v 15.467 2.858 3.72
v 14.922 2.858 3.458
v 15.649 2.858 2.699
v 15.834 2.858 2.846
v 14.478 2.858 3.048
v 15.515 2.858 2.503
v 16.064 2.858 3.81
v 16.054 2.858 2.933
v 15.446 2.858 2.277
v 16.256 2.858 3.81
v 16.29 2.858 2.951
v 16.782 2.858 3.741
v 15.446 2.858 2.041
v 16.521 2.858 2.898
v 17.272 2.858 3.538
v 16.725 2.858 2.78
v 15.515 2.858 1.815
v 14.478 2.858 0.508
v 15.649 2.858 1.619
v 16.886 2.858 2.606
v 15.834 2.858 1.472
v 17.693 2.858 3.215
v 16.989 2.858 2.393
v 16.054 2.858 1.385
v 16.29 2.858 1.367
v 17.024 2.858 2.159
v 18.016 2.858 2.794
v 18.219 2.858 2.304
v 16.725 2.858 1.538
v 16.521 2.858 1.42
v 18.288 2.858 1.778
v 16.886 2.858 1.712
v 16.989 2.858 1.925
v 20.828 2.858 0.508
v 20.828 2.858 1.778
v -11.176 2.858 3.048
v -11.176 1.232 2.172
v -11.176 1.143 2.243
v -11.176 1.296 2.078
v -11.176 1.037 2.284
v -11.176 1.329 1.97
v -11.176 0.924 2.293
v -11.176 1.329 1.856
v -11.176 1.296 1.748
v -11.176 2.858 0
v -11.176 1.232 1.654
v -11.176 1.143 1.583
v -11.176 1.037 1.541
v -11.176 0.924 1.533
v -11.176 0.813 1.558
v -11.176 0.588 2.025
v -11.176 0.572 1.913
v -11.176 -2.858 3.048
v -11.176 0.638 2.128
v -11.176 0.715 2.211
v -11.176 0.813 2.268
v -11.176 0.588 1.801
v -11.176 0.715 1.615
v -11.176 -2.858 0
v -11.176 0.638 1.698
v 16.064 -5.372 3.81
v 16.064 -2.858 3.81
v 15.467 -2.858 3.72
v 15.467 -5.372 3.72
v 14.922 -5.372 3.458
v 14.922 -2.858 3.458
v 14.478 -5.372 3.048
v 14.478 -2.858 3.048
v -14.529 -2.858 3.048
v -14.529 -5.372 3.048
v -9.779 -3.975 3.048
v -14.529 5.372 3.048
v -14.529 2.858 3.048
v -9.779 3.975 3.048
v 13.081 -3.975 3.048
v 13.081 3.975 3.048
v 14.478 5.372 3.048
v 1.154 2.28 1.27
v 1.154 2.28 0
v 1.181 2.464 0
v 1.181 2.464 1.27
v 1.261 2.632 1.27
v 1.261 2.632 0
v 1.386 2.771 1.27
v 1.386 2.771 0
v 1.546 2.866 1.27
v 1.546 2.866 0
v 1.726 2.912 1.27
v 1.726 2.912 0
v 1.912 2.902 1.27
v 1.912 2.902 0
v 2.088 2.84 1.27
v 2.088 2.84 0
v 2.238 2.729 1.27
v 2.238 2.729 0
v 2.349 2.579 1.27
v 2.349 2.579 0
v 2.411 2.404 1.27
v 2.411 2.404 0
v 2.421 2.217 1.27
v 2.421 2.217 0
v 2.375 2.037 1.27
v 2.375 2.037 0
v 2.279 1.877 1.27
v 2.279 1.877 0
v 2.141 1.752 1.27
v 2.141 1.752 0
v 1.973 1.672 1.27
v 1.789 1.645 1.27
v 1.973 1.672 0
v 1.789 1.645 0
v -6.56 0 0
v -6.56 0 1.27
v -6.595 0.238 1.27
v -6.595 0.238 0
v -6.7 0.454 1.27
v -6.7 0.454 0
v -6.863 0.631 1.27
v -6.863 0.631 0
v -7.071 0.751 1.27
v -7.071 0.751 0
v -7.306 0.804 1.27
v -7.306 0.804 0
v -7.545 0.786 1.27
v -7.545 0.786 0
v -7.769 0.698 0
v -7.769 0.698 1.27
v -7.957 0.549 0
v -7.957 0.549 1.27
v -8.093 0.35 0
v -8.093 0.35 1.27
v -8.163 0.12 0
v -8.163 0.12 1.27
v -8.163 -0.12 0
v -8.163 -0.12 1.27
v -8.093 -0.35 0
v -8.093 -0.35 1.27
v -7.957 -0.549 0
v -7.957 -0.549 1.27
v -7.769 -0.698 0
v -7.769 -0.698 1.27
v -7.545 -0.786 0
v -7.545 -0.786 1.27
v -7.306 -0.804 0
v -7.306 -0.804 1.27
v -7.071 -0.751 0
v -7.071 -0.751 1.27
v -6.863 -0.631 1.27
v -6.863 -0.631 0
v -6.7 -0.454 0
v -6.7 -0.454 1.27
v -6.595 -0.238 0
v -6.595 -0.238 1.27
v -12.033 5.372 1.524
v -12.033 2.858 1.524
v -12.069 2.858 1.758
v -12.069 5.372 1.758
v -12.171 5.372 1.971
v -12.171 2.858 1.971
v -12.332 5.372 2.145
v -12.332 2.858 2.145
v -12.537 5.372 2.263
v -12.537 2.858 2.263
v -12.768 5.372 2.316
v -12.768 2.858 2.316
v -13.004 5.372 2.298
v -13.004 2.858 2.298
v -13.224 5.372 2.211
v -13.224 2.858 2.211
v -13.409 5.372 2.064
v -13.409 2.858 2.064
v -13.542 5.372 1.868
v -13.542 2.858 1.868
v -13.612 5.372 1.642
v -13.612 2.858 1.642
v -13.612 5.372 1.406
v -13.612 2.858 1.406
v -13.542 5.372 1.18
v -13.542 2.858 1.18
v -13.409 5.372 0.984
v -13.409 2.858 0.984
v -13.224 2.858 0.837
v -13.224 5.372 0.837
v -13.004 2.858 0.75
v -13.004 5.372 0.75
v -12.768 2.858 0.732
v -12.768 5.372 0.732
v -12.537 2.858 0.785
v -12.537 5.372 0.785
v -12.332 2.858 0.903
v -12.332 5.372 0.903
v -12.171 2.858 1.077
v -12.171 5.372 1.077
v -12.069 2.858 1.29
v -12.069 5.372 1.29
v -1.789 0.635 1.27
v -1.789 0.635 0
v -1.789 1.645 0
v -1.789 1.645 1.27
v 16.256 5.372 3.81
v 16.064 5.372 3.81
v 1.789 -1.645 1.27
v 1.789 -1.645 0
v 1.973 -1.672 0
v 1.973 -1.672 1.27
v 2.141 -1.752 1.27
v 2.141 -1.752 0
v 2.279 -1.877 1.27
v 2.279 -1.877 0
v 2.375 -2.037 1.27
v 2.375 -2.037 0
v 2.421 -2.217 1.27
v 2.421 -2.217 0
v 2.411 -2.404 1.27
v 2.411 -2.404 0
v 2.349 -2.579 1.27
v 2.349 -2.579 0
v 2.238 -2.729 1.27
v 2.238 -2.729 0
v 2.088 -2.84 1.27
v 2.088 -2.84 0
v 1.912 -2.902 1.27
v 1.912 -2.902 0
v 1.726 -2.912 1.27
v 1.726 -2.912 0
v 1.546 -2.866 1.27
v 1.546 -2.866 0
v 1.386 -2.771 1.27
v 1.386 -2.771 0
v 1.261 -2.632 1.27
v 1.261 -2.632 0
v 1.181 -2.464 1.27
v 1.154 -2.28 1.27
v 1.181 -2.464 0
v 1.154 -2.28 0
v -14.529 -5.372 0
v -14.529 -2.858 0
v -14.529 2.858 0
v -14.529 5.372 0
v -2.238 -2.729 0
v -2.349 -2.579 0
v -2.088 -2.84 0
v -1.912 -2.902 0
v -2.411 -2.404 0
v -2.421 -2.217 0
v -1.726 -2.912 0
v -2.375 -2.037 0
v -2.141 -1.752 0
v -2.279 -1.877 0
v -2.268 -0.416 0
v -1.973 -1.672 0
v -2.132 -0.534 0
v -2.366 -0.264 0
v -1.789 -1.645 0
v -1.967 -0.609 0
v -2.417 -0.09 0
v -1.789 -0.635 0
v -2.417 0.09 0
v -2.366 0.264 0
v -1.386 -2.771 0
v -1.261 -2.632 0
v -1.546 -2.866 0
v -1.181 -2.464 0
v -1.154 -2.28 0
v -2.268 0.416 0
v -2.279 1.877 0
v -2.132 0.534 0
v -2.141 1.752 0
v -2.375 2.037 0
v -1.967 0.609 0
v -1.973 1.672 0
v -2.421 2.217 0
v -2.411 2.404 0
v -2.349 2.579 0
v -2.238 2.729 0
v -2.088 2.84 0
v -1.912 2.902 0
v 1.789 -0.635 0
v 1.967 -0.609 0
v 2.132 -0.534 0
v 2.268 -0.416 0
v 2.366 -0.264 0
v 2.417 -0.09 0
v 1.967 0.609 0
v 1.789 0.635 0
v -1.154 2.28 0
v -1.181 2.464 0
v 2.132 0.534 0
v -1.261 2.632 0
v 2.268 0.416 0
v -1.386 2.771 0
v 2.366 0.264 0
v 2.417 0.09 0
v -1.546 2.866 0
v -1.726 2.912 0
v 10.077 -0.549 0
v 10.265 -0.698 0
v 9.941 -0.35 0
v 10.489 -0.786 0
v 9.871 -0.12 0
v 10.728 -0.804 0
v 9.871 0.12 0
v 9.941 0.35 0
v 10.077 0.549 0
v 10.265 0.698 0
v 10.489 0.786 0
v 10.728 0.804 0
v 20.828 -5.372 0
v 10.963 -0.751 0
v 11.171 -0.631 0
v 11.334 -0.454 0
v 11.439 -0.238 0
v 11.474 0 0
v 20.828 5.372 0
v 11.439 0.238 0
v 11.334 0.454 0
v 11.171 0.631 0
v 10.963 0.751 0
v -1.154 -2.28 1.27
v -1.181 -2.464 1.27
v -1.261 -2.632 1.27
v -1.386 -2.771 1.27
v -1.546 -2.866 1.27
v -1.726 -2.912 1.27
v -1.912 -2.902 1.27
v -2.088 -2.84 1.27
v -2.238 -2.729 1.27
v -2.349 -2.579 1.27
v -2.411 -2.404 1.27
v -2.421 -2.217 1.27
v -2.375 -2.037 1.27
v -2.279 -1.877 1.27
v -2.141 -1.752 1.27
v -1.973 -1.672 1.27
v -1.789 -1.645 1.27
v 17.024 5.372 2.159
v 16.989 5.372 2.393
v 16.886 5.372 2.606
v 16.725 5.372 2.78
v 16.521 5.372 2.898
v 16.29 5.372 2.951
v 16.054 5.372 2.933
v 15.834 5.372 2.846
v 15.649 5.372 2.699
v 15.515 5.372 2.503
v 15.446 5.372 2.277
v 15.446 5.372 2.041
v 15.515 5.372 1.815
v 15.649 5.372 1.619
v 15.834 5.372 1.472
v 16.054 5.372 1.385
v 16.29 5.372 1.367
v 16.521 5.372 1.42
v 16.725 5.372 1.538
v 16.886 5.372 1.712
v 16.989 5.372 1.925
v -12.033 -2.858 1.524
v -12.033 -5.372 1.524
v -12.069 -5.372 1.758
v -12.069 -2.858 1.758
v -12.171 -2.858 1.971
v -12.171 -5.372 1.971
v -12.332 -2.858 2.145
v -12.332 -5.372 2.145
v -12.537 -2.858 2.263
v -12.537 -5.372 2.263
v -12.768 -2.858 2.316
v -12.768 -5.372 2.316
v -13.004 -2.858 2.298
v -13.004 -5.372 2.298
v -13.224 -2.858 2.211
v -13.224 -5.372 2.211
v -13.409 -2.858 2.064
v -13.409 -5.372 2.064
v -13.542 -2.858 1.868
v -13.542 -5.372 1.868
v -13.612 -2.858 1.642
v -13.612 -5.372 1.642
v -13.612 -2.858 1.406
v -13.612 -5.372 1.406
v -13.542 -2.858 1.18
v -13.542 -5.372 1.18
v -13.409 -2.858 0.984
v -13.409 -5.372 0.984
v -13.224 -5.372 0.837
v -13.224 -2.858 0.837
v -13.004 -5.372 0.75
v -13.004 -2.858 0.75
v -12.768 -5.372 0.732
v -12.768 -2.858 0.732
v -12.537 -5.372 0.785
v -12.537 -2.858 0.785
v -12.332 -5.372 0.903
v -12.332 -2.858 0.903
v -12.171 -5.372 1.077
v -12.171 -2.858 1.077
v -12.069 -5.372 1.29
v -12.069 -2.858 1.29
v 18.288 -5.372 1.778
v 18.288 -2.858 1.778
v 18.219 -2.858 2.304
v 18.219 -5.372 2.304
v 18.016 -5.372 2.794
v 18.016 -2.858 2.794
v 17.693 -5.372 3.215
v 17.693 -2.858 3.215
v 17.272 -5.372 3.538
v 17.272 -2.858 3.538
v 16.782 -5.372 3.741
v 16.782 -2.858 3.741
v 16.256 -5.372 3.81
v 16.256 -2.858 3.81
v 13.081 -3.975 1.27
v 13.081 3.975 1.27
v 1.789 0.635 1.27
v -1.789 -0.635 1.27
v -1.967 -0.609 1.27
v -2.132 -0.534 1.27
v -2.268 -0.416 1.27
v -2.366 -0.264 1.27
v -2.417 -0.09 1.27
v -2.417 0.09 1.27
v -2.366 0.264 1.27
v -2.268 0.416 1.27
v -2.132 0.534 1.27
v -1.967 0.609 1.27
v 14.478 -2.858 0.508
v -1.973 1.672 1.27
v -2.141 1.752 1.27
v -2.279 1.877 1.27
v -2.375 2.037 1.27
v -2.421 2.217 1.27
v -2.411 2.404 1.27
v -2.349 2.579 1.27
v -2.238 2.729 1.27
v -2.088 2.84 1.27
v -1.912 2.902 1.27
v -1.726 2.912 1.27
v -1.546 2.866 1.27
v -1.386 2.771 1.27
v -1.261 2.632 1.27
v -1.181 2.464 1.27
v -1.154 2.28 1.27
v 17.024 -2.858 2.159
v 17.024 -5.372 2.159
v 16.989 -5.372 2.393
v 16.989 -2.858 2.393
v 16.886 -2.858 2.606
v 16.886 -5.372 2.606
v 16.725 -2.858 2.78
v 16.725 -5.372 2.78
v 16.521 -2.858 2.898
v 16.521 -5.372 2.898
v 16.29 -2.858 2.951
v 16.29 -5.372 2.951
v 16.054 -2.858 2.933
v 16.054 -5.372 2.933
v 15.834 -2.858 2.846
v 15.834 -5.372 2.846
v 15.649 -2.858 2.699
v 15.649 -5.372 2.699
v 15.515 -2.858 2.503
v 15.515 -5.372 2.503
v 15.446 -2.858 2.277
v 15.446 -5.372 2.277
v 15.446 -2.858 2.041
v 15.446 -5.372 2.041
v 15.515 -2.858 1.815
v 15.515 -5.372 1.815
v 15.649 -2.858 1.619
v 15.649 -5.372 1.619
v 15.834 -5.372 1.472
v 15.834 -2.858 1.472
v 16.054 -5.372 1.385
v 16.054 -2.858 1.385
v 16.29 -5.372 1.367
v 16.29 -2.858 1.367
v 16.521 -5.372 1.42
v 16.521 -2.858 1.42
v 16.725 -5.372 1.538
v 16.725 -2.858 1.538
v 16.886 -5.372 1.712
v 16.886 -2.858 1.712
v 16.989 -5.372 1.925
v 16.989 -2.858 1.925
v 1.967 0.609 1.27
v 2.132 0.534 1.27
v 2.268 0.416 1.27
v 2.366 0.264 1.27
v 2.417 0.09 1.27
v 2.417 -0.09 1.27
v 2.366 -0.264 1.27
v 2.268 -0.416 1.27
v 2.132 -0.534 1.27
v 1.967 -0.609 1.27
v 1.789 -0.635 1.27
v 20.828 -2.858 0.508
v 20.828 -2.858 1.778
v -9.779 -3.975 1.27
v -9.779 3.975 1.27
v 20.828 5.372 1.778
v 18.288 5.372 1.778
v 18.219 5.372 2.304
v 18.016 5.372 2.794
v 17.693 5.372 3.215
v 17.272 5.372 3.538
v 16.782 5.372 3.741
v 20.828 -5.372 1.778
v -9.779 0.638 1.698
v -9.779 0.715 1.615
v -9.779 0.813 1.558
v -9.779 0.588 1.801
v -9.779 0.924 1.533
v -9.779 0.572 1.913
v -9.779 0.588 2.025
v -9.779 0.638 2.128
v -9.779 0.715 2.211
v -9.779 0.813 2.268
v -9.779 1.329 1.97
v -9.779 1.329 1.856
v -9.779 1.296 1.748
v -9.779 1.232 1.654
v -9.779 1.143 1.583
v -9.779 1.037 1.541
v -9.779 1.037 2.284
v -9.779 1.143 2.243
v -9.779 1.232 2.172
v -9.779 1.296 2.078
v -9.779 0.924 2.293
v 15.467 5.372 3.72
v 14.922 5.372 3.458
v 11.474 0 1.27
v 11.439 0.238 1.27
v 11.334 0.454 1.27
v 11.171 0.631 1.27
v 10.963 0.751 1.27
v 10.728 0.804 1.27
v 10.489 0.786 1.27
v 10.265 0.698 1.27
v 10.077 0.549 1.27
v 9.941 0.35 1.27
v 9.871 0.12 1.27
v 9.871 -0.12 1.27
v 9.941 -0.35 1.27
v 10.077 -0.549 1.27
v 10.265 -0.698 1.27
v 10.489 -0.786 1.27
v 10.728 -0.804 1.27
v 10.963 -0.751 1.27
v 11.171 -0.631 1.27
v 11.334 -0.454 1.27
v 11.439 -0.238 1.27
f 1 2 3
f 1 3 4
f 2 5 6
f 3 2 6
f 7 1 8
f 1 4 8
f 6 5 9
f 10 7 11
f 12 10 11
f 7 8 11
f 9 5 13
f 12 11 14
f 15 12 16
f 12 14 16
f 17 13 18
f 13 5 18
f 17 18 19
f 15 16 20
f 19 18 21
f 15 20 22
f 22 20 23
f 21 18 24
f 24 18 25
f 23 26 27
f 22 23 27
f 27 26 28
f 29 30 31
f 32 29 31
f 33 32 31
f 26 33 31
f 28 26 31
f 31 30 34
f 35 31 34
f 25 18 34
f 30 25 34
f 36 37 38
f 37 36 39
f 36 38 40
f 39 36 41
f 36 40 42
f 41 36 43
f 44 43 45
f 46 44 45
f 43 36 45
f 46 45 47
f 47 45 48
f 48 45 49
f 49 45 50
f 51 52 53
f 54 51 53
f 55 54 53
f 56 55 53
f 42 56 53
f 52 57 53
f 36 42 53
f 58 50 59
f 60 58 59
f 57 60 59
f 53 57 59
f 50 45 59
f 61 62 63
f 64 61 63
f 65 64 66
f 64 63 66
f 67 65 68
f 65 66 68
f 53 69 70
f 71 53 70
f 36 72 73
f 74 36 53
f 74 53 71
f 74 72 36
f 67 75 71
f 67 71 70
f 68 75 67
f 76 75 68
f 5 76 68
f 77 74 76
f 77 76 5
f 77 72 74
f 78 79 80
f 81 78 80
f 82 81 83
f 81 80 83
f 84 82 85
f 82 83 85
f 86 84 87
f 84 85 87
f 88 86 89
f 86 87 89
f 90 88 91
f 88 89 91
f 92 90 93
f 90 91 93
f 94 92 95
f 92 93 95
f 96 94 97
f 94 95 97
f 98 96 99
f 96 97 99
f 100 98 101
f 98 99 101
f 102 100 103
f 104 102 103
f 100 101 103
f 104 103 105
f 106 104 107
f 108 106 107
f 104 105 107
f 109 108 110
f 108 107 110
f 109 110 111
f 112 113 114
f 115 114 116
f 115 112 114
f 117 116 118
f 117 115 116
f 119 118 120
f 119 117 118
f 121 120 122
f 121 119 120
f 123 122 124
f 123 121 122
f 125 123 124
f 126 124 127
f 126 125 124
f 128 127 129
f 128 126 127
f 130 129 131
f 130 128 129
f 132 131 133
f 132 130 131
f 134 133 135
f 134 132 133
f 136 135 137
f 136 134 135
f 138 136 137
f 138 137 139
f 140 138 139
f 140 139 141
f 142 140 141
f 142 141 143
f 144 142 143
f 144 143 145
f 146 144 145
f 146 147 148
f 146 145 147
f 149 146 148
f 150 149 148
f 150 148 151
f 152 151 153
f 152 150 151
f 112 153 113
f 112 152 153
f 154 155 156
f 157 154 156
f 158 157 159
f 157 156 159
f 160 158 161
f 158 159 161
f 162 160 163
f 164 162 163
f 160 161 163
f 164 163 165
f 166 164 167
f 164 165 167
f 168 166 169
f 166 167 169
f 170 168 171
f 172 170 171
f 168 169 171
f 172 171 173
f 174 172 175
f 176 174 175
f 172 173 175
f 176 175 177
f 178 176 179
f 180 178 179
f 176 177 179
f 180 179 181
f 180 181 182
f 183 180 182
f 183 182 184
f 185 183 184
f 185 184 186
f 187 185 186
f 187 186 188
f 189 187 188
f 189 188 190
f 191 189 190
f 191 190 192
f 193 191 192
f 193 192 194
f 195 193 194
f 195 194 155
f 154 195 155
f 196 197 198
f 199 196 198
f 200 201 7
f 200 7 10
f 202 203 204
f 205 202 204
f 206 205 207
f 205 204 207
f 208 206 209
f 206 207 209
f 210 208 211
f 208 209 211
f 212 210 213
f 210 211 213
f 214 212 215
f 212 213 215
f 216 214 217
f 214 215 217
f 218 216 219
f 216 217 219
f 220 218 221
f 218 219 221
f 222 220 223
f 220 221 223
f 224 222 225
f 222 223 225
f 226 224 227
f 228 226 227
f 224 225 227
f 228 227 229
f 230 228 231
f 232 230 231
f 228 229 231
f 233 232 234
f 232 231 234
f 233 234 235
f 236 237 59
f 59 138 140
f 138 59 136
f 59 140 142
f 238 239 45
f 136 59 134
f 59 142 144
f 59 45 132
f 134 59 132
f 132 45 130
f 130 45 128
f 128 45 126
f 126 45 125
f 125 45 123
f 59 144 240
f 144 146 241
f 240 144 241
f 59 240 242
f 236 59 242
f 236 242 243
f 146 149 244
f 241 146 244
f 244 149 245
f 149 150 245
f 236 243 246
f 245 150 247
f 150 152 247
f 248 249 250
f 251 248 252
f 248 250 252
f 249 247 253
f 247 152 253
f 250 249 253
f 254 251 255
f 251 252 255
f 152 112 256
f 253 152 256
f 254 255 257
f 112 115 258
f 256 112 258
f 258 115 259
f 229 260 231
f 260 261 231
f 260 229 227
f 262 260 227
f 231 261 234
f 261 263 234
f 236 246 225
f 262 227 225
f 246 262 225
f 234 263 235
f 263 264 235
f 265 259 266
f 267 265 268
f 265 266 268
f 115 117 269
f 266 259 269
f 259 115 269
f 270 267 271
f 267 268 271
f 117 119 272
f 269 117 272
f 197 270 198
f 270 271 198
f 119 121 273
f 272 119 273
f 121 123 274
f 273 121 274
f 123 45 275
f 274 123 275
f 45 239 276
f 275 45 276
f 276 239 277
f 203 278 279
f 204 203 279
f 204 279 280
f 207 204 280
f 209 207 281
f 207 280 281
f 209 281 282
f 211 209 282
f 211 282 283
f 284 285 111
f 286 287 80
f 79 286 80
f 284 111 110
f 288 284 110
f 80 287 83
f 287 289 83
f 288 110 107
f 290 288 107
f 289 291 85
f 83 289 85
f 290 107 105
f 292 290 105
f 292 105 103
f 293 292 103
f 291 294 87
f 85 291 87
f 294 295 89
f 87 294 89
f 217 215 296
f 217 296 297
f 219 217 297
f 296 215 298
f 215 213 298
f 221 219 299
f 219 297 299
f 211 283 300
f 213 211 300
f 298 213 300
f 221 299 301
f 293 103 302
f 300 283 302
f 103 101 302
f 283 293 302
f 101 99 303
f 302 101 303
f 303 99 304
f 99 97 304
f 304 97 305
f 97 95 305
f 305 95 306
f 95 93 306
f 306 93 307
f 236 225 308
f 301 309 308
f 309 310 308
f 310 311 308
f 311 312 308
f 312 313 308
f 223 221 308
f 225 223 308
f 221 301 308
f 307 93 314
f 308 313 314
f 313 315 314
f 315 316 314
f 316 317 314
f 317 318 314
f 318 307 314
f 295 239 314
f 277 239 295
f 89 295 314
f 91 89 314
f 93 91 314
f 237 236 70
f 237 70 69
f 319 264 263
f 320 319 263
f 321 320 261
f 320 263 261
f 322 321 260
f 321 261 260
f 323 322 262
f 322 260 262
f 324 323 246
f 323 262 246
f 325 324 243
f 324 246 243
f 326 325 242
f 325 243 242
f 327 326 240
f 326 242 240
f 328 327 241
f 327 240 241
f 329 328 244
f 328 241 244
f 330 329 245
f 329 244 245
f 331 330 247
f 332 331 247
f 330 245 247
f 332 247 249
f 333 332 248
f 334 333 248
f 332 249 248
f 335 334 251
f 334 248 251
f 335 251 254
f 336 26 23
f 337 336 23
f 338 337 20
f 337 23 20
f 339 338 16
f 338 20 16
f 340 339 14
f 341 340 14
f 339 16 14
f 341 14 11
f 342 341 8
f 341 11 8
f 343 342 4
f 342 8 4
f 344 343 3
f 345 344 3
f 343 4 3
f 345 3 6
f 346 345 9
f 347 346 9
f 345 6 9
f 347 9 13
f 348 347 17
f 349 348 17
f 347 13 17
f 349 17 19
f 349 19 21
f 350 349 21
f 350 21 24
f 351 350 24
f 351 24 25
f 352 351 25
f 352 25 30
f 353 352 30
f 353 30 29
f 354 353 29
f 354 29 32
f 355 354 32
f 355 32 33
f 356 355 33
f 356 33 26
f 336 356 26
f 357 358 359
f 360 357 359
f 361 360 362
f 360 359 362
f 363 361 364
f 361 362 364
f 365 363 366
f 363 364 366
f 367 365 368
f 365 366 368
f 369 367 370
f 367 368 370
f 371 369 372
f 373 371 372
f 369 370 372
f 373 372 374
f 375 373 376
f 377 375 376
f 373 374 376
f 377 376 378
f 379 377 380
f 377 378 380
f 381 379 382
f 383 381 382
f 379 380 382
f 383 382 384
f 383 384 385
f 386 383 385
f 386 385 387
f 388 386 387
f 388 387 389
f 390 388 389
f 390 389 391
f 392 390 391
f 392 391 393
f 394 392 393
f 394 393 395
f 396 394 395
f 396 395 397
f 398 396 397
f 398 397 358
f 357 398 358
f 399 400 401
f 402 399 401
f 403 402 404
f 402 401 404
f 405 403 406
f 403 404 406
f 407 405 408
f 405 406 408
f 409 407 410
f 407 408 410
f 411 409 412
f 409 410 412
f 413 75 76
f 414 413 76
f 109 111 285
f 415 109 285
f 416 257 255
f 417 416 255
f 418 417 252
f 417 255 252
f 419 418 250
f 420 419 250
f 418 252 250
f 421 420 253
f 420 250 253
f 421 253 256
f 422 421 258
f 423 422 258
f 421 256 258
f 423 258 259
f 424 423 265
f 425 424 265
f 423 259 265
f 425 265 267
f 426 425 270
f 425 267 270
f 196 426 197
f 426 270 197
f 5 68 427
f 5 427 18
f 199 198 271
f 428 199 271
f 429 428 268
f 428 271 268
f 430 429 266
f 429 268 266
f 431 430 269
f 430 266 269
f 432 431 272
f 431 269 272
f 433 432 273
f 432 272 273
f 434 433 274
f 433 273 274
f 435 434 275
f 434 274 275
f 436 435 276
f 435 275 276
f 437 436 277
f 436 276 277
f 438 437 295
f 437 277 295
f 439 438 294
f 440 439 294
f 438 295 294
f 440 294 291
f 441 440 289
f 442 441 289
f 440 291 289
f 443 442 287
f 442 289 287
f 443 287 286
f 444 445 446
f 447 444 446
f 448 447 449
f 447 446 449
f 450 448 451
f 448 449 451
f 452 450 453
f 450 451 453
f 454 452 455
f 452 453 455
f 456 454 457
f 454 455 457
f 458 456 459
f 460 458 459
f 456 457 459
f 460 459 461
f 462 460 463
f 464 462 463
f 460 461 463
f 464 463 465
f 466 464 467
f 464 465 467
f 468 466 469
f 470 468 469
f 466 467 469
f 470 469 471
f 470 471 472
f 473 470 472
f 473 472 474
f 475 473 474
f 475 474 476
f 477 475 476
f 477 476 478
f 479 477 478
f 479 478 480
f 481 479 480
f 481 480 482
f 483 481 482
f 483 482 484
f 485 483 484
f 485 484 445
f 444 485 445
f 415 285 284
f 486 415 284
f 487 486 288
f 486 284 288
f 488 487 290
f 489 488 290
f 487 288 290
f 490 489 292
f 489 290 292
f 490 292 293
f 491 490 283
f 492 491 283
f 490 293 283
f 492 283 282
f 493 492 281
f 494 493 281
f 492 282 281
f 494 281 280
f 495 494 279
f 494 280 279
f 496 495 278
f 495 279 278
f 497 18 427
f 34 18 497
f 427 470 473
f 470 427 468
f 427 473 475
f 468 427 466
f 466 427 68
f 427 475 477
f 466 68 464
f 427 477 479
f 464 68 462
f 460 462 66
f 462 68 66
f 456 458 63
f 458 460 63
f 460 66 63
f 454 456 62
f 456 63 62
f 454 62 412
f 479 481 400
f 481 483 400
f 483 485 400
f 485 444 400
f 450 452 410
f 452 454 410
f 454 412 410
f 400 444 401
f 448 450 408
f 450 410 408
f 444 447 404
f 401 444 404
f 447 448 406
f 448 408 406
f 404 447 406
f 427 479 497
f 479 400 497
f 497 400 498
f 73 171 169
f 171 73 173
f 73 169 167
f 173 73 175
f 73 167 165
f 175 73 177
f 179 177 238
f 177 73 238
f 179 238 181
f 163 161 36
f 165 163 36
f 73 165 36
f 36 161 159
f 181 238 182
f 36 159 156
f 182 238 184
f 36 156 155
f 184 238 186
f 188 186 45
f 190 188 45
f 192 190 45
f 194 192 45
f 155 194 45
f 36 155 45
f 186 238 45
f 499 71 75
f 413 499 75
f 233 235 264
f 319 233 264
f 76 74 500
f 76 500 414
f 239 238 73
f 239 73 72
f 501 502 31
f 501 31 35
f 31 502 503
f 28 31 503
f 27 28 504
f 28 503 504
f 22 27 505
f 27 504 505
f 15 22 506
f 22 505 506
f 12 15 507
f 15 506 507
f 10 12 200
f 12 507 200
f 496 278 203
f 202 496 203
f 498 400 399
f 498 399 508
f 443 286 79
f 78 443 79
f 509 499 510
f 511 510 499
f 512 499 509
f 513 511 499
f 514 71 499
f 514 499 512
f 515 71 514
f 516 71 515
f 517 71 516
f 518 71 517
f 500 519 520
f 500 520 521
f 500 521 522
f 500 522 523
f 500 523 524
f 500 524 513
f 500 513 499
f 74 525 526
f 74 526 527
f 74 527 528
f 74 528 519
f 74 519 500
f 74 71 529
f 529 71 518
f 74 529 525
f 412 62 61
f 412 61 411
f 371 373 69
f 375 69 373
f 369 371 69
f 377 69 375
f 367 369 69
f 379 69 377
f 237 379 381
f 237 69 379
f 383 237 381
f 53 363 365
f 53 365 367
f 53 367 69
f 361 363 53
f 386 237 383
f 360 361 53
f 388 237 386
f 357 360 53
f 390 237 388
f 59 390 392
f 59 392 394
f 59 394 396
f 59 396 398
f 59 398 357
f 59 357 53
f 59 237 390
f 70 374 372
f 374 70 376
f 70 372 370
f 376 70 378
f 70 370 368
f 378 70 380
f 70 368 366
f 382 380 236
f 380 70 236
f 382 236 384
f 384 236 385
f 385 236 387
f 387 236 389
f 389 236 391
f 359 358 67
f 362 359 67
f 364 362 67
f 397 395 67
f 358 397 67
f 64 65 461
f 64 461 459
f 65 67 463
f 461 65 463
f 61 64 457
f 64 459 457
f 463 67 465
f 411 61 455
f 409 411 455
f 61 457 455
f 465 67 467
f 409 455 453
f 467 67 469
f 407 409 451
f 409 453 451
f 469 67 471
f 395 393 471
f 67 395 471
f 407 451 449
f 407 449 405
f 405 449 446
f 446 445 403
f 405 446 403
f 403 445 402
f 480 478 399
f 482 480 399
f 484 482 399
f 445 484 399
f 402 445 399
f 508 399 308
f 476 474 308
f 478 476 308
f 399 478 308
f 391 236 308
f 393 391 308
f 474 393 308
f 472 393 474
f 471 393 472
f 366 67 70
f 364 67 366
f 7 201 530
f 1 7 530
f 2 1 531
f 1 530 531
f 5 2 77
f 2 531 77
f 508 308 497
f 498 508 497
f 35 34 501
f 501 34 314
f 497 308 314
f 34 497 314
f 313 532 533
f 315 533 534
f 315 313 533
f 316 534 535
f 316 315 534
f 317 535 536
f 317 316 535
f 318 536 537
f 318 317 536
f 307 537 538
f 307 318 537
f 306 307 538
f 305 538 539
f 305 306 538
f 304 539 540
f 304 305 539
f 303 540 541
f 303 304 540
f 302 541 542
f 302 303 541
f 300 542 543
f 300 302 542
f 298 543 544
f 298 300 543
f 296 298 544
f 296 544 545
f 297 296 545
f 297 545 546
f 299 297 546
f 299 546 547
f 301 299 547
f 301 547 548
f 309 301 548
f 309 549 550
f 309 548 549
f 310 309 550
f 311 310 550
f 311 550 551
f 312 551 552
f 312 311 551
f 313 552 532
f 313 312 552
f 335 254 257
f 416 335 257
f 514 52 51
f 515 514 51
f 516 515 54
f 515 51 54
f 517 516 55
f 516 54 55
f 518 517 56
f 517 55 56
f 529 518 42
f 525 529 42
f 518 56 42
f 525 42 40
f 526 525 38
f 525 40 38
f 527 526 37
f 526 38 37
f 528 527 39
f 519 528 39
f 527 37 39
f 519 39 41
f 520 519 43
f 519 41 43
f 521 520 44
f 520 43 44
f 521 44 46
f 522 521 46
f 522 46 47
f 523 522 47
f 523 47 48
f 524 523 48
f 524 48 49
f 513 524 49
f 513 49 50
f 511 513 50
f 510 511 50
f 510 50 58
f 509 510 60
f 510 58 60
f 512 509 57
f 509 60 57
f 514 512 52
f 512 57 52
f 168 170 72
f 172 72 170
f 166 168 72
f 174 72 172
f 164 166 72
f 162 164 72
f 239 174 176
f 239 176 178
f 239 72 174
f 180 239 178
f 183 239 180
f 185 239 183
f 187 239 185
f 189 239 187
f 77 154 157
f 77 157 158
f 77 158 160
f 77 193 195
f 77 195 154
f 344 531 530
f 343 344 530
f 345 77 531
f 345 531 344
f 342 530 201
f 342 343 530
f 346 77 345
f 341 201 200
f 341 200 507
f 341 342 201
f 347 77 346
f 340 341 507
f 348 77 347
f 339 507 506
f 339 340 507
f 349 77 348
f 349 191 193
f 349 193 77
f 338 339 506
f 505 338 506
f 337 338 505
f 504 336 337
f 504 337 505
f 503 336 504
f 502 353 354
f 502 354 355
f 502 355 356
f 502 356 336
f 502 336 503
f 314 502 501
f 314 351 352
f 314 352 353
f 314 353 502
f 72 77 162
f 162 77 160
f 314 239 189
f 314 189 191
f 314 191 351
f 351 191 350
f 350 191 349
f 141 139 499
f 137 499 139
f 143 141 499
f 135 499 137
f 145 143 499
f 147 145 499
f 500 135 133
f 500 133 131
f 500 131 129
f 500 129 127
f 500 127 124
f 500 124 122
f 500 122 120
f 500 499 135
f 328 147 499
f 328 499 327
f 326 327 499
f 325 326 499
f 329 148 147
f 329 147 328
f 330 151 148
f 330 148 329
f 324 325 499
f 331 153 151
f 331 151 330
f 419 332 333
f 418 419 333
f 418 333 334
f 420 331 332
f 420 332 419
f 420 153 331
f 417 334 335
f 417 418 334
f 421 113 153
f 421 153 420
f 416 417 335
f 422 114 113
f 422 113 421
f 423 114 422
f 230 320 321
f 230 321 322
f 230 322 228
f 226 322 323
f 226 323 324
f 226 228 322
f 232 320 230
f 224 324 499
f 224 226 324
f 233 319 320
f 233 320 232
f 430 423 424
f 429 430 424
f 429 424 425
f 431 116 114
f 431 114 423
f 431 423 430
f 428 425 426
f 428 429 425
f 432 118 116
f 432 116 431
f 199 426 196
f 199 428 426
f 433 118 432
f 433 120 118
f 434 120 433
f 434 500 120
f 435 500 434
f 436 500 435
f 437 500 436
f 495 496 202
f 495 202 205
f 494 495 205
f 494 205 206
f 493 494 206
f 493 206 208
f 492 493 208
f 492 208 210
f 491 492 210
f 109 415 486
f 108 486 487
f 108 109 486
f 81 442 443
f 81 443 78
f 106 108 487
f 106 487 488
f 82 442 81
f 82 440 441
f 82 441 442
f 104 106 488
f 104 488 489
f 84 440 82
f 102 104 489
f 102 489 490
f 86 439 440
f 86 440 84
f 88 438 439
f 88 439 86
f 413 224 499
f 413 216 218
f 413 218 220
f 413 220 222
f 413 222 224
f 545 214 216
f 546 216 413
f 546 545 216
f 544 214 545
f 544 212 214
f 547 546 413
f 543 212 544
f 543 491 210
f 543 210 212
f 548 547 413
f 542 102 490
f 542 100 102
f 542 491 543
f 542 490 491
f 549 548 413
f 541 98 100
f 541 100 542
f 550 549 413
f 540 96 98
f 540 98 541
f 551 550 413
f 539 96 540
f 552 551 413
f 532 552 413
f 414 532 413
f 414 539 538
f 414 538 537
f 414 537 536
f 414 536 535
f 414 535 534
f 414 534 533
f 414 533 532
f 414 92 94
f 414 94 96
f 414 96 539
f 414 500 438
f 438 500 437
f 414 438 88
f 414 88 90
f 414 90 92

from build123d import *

# Parameters (mm, degrees)
F0_W         = 3.3528
F0_H         = 2.5146
F0_R         = 0.80645
F0_W_2       = 6.35
F0_H_2       = 10.7442
F1_DEPTH     = 3.048
F2_W         = 2.54
F2_H         = 10.7442
F2_W_2       = 22.86
F2_H_2       = 7.9502
F3_DEPTH     = 1.27
F4_W         = 6.35
F4_H         = 5.715
F5_DEPTH     = 2.54
F6_R         = 0.79375
F7_DEPTH     = 10.7452
F8_DEPTH     = 0.508
F9_W         = 3.81
F9_H         = 2.5146
F10_DEPTH    = 0.762
F11_T1_DEPTH = 10.445747458
F11_T3_DEPTH = 10.445747458
F11_T5_DEPTH = 12.6746
F11_T7_DEPTH = 12.6746
F12_R        = 0.381
F13_DEPTH    = 1.397


# Not quite as in the source:
# - a fillet or chamfer that OpenCascade refuses, or shapes differently, is made with other operations: its cross-section is extruded or revolved along the edge and cut away or added
# - a feature names something its author has since deleted; it is built from what else it names


with BuildPart() as f1:
    # F0 (on Top) → F1 (new body)
    with BuildSketch(Plane.XY):
        with Locations((-12.8524, 4.1148)):
            Rectangle(F0_W, F0_H)
        with Locations((-12.8524, -4.1148)):
            Rectangle(F0_W, F0_H)
        Polygon((14.478, -5.3721), (14.478, 5.3721), (-11.176, 5.3721), (-11.176, 2.8575), (-11.176, -2.8575), (-11.176, -5.3721), align=None)
        with Locations((-7.366, 0)):
            Circle(F0_R, mode=Mode.SUBTRACT)
        with BuildLine():
            ThreePointArc((-1.7885716042, 1.644670926), (-2.2375844102, 2.728683732), (-1.1535716042, 2.279670926))
            Line((-1.1535716042, 2.279670926), (1.1535716042, 2.279670926))
            ThreePointArc((1.1535716042, 2.279670926), (2.2375844102, 2.728683732), (1.7885716042, 1.644670926))
            Line((1.7885716042, 1.644670926), (1.7885716042, 0.635))
            ThreePointArc((1.7885716042, 0.635), (2.4235716042, 0), (1.7885716042, -0.635))
            Line((1.7885716042, -0.635), (1.7885716042, -1.644670926))
            ThreePointArc((1.7885716042, -1.644670926), (2.2375844102, -2.728683732), (1.1535716042, -2.279670926))
            Line((1.1535716042, -2.279670926), (-1.1535716042, -2.279670926))
            ThreePointArc((-1.1535716042, -2.279670926), (-2.2375844102, -2.728683732), (-1.7885716042, -1.644670926))
            Line((-1.7885716042, -1.644670926), (-1.7885716042, -0.635))
            ThreePointArc((-1.7885716042, -0.635), (-2.4235716042, 0), (-1.7885716042, 0.635))
            Line((-1.7885716042, 0.635), (-1.7885716042, 1.644670926))
        make_face(mode=Mode.SUBTRACT)
        with Locations((10.668, 0)):
            Circle(F0_R, mode=Mode.SUBTRACT)
        with Locations((17.653, 0)):
            Rectangle(F0_W_2, F0_H_2)
    extrude(amount=F1_DEPTH)

    # F2 (on face) → F3 (cut)
    with BuildSketch(Plane.XY.offset(3.048)):
        with Locations((19.558, 0)):
            Rectangle(F2_W, F2_H)
        with Locations((1.651, 0)):
            Rectangle(F2_W_2, F2_H_2)
    extrude(amount=-F3_DEPTH, mode=Mode.SUBTRACT)

    # F4 (on face) → F5 (cut)
    with BuildSketch(Plane.XY.offset(3.048)):
        with Locations((17.653, 0)):
            Rectangle(F4_W, F4_H)
    extrude(amount=-F5_DEPTH, mode=Mode.SUBTRACT)

    # F6 (on face) → F7 (cut, through all)
    with BuildSketch(Plane.XZ.offset(5.3721)):
        with Locations((-12.827, 1.524)):
            Circle(F6_R)
        with Locations((16.2306, 2.159)):
            Circle(F6_R)
    extrude(amount=-F7_DEPTH, mode=Mode.SUBTRACT)

    # F8 (cut): a face of the model
    f8_faces = [f1.faces().sort_by_distance(p)[0] for p in [
        (-9.5369699853, 0, 1.778),
    ]]
    extrude(f8_faces, amount=-F8_DEPTH, mode=Mode.SUBTRACT)

    # F9 (on face) → F10 (join)
    with BuildSketch(Plane.XY.offset(3.048)):
        with Locations((16.383, 4.1148)):
            Rectangle(F9_W, F9_H)
        with Locations((16.383, -4.1148)):
            Rectangle(F9_W, F9_H)
    extrude(amount=F10_DEPTH)

    # F11: fillet of radius 2.032 on 4 edges, made by hand

    # F11_s2 → F11_t1 (cut)
    with BuildSketch(Plane.XZ.offset(-1.108073729)):
        with BuildLine():
            ThreePointArc((16.0642294916, 3.81), (15.1843476813, 3.6096200479), (14.478, 3.048))
            Line((14.478, 3.048), (14.478, 3.81))
            Line((14.478, 3.81), (16.0642294916, 3.81))
        make_face()
    extrude(amount=F11_T1_DEPTH, mode=Mode.SUBTRACT)

    # F11_s4 → F11_t3 (cut)
    with BuildSketch(Plane.XZ.offset(-9.337673729)):
        with BuildLine():
            ThreePointArc((16.0642294916, 3.81), (15.1843476813, 3.6096200479), (14.478, 3.048))
            Line((14.478, 3.048), (14.478, 3.81))
            Line((14.478, 3.81), (16.0642294916, 3.81))
        make_face()
    extrude(amount=F11_T3_DEPTH, mode=Mode.SUBTRACT)

    # F11_s6 → F11_t5 (cut)
    with BuildSketch(Plane.XZ.offset(-10.4521)):
        with BuildLine():
            ThreePointArc((18.288, 1.778), (17.6928409794, 3.2148409794), (16.256, 3.81))
            Line((16.256, 3.81), (18.288, 3.81))
            Line((18.288, 3.81), (18.288, 1.778))
        make_face()
    extrude(amount=F11_T5_DEPTH, mode=Mode.SUBTRACT)

    # F11_s8 → F11_t7 (cut)
    with BuildSketch(Plane.XZ.offset(-2.2225)):
        with BuildLine():
            ThreePointArc((18.288, 1.778), (17.6928409794, 3.2148409794), (16.256, 3.81))
            Line((16.256, 3.81), (18.288, 3.81))
            Line((18.288, 3.81), (18.288, 1.778))
        make_face()
    extrude(amount=F11_T7_DEPTH, mode=Mode.SUBTRACT)

    # F12 (on face) → F13 (cut, through all)
    with BuildSketch(Plane(origin=(-11.176, 0, 0), x_dir=(0, -1, 0), z_dir=(-1, 0, 0))):
        with Locations((-0.9525, 1.9129452994)):
            Circle(F12_R)
    extrude(amount=-F13_DEPTH, mode=Mode.SUBTRACT)


solid = f1.part
